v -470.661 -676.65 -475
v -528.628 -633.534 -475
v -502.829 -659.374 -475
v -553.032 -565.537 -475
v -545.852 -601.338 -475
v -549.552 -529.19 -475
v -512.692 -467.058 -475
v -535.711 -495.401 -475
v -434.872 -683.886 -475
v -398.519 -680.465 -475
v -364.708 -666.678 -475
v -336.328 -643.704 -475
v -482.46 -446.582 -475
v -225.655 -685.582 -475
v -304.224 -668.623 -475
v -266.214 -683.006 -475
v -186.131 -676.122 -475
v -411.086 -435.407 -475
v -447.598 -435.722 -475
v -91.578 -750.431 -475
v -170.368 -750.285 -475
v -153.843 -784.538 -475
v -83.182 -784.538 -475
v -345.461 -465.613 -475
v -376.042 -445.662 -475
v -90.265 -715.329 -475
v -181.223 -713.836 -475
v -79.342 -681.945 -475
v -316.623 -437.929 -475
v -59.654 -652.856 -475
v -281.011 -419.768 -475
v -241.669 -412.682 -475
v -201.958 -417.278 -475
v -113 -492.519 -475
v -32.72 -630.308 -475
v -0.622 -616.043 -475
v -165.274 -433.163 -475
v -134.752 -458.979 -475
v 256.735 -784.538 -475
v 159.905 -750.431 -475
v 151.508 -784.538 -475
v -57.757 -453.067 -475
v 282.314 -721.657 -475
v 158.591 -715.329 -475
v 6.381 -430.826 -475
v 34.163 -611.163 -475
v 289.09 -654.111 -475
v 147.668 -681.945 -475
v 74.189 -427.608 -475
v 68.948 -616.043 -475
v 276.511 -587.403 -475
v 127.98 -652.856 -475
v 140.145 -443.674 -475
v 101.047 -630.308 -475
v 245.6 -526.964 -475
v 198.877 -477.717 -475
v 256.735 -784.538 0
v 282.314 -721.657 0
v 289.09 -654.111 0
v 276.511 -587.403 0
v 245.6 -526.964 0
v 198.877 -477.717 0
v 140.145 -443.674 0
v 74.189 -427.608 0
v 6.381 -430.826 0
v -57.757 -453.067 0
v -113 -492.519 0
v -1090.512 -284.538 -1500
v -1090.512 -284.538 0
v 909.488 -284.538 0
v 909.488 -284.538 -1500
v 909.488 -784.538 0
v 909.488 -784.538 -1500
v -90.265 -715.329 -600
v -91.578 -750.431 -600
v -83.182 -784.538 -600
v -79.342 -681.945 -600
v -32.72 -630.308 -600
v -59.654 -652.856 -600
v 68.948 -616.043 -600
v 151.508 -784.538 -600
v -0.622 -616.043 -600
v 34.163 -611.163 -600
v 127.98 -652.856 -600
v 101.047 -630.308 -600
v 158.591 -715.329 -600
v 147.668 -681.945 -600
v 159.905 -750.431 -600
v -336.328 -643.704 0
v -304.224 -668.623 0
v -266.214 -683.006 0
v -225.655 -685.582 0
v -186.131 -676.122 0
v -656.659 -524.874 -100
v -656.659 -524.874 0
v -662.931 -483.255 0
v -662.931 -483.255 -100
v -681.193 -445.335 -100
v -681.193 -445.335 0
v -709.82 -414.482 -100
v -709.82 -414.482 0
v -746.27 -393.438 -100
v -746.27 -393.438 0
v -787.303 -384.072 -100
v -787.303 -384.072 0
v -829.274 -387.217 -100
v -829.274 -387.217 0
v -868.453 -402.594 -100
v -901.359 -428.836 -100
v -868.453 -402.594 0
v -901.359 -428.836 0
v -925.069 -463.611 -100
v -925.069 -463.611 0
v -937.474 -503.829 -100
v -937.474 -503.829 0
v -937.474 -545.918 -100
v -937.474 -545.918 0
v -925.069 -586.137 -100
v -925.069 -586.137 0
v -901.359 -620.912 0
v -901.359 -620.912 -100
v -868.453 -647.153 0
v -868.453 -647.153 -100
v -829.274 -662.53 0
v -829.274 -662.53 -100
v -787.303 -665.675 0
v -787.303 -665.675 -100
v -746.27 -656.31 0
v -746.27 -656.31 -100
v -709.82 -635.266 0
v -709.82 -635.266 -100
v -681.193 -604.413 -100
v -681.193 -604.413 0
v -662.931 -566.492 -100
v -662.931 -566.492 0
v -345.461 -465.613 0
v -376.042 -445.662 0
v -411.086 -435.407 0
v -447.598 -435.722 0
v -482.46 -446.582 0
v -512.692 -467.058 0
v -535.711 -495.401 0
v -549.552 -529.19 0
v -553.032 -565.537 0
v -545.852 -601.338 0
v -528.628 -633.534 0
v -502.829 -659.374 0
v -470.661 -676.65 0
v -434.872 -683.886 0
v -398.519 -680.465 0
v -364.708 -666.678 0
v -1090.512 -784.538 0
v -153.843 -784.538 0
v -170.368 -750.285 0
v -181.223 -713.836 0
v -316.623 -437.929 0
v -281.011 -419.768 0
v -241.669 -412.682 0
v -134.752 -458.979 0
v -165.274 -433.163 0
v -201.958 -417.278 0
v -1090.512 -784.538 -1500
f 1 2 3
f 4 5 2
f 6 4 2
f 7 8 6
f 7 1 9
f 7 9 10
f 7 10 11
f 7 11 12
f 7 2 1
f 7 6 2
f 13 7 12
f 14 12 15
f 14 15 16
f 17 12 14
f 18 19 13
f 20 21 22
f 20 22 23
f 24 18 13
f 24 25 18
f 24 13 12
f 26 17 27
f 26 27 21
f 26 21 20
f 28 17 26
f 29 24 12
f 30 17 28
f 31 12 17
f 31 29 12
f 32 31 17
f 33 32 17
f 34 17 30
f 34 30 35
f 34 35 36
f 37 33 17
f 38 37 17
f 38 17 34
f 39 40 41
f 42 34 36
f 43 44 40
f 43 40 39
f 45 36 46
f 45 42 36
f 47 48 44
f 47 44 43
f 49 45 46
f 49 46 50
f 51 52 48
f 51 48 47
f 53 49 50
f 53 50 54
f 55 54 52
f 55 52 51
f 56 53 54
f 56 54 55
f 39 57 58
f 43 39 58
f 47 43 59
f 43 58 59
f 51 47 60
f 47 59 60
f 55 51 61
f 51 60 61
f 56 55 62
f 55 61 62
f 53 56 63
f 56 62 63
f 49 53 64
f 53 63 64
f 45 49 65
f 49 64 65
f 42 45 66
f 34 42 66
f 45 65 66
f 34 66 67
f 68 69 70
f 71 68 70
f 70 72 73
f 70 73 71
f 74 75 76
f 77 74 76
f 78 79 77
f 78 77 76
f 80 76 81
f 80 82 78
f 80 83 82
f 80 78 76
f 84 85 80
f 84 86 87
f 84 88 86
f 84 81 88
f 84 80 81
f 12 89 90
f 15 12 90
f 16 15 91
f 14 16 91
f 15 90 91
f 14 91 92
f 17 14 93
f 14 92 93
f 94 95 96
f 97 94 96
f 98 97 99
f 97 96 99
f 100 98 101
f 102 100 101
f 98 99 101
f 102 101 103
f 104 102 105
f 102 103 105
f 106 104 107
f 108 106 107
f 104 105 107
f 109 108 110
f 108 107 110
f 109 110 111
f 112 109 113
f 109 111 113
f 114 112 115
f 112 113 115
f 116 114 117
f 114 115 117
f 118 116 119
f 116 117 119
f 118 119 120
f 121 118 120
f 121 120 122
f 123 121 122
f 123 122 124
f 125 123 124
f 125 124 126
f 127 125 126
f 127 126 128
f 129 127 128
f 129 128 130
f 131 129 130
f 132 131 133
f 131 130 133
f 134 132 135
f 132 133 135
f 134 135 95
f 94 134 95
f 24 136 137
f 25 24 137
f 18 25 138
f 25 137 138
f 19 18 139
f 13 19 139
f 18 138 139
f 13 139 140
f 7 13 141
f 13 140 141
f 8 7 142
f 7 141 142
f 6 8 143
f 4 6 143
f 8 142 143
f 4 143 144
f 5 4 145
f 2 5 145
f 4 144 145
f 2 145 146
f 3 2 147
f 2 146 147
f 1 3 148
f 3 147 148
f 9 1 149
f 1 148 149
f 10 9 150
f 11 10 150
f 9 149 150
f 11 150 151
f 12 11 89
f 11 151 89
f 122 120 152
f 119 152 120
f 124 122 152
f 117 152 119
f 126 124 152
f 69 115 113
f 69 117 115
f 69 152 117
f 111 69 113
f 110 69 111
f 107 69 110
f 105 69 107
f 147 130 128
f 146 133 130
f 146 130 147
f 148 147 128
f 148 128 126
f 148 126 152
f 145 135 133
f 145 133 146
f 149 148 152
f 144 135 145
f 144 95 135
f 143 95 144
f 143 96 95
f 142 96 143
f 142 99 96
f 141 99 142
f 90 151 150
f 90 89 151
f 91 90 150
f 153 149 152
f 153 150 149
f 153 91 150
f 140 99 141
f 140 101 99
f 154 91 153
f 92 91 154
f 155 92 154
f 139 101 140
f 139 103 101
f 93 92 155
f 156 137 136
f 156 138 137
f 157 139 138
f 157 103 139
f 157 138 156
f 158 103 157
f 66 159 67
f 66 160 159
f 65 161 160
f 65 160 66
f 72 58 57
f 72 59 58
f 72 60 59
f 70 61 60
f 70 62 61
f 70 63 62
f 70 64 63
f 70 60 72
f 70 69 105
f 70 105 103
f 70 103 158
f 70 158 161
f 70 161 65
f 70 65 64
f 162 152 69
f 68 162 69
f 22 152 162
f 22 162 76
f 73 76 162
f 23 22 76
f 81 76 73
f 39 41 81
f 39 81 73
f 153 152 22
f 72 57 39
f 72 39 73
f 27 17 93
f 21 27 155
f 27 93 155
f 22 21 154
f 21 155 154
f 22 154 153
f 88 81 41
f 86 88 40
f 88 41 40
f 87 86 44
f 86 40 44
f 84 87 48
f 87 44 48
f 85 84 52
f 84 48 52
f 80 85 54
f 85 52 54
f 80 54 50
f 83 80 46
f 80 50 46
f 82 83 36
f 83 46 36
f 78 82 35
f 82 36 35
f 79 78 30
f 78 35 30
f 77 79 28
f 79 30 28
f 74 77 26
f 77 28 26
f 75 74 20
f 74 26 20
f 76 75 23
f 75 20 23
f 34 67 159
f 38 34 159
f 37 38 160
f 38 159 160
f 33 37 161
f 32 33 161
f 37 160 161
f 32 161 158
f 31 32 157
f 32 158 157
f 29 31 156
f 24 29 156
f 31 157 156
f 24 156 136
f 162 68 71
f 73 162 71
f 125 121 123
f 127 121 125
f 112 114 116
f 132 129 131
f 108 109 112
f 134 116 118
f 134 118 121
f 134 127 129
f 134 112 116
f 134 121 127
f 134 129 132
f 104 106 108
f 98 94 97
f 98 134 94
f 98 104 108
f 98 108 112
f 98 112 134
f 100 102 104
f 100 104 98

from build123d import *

# Parameters (mm, degrees)
F0_W      = 2000
F0_H      = 500
F1_DEPTH  = 1500
F2_R      = 141.1964442428
F3_DEPTH  = 100
F4_R      = 34.4012155817
F1_FACE_W = 2000
F1_FACE_H = 500
F1_FACE_R = 141.1964442428
F5_DEPTH  = 300
F6_R      = 22.2612942047
F7_DEPTH  = 25
F11_DEPTH = 25
F12_DEPTH = 500
F13_R     = 126.398375951
F14_DEPTH = 600


# Not quite as in the source:
# - a feature of the source that left no trace in its solid (it failed there, or was rolled back) is left out


with BuildPart() as f1:
    # F0 (on Top) → F1 (new body)
    with BuildSketch(Plane.XY):
        with Locations((-90.5123054981, -534.5377490795)):
            Rectangle(F0_W, F0_H)
    extrude(amount=-F1_DEPTH)

    # F2 (on Top) → F3 (cut)
    with BuildSketch(Plane.XY):
        with Locations((-797.8549599648, -524.8737335205)):
            Circle(F2_R)
    extrude(amount=-F3_DEPTH, mode=Mode.SUBTRACT)

    # F4 (on face) + F1_face (on face) → F5 (cut)
    with BuildSketch(Plane.XY.offset(-100)):
        with Locations((-826.4881968498, -472.618997097)):
            Circle(F4_R)
    with BuildSketch(Plane(origin=(-43.2497509657, -535.1834701589, 0), x_dir=(1, 0, 0), z_dir=(0, 0, 1))):
        with Locations((-47.2625545324, 0.6457210794)):
            Rectangle(F1_FACE_W, F1_FACE_H)
        with Locations((-754.605208999, 10.3097366384)):
            Circle(F1_FACE_R, mode=Mode.SUBTRACT)
    extrude(amount=F5_DEPTH, mode=Mode.SUBTRACT)

    # F6 (on Top) → F7 (cut)
    with BuildSketch(Plane.XY):
        with Locations((-837.3667597771, -527.3413062096)):
            Circle(F6_R)
    extrude(amount=-F7_DEPTH, mode=Mode.SUBTRACT)

    # F10 (on Top) → F11 (join)
    with BuildSketch(Plane.XY):
        with BuildLine():
            ThreePointArc((-336.3280592399, -643.7038848361), (-311.8886426753, -604.522487328), (-303.3533888527, -559.1394901276))
            ThreePointArc((-303.3533888527, -559.1394901276), (-314.3656518823, -507.8553931627), (-345.4608968402, -465.6130651073))
            ThreePointArc((-345.4608968402, -465.6130651073), (-373.9207280875, -556.3521241934), (-336.3280592399, -643.7038848361))
        make_face()
        with BuildLine():
            ThreePointArc((-345.4608968402, -465.6130651073), (-314.3656518823, -507.8553931627), (-303.3533888527, -559.1394901276))
            ThreePointArc((-303.3533888527, -559.1394901276), (-311.8886426753, -604.522487328), (-336.3280592399, -643.7038848361))
            ThreePointArc((-336.3280592399, -643.7038848361), (-266.2138077643, -683.0061743425), (-186.1307836251, -676.1223189436))
            ThreePointArc((-186.1307836251, -676.1223189436), (-169.5365195374, -576.3659050684), (-113.0004686355, -492.5185040457))
            ThreePointArc((-113.0004686355, -492.5185040457), (-221.6444367274, -413.5213420531), (-345.4608968402, -465.6130651073))
        make_face()
        with BuildLine():
            ThreePointArc((-336.3280592399, -643.7038848361), (-373.9207280875, -556.3521241934), (-345.4608968402, -465.6130651073))
            ThreePointArc((-345.4608968402, -465.6130651073), (-553.0316980704, -565.5372770485), (-336.3280592399, -643.7038848361))
        make_face()
        with BuildLine():
            ThreePointArc((289.3120863194, -664.3842458725), (144.8913865697, -445.641688806), (-113.0004686355, -492.5185040457))
            ThreePointArc((-113.0004686355, -492.5185040457), (-103.7589334647, -520.2685961551), (-100.6307099798, -549.3493080139))
            ThreePointArc((-100.6307099798, -549.3493080139), (-124.0033138355, -625.8046199509), (-186.1307836251, -676.1223189436))
            ThreePointArc((-186.1307836251, -676.1223189436), (57.3165773299, -902.1781192905), (289.3120863194, -664.3842458725))
        make_face()
        with BuildLine():
            ThreePointArc((-100.6307099798, -549.3493080139), (-103.7589334647, -520.2685961551), (-113.0004686355, -492.5185040457))
            ThreePointArc((-113.0004686355, -492.5185040457), (-169.5365195374, -576.3659050684), (-186.1307836251, -676.1223189436))
            ThreePointArc((-186.1307836251, -676.1223189436), (-124.0033138355, -625.8046199509), (-100.6307099798, -549.3493080139))
        make_face()
    extrude(amount=F11_DEPTH)

    # F12 (cut): a face of the model
    f12_faces = [f1.faces().sort_by_distance(p)[0] for p in [
        (-80.6836957397, -625.9699801923, 25),
    ]]
    extrude(f12_faces, amount=-F12_DEPTH, mode=Mode.SUBTRACT)

    # F13 (on Top) → F14 (cut)
    with BuildSketch(Plane.XY):
        with Locations((34.1630466282, -737.5611066818)):
            Circle(F13_R)
    extrude(amount=-F14_DEPTH, mode=Mode.SUBTRACT)


solid = f1.part
